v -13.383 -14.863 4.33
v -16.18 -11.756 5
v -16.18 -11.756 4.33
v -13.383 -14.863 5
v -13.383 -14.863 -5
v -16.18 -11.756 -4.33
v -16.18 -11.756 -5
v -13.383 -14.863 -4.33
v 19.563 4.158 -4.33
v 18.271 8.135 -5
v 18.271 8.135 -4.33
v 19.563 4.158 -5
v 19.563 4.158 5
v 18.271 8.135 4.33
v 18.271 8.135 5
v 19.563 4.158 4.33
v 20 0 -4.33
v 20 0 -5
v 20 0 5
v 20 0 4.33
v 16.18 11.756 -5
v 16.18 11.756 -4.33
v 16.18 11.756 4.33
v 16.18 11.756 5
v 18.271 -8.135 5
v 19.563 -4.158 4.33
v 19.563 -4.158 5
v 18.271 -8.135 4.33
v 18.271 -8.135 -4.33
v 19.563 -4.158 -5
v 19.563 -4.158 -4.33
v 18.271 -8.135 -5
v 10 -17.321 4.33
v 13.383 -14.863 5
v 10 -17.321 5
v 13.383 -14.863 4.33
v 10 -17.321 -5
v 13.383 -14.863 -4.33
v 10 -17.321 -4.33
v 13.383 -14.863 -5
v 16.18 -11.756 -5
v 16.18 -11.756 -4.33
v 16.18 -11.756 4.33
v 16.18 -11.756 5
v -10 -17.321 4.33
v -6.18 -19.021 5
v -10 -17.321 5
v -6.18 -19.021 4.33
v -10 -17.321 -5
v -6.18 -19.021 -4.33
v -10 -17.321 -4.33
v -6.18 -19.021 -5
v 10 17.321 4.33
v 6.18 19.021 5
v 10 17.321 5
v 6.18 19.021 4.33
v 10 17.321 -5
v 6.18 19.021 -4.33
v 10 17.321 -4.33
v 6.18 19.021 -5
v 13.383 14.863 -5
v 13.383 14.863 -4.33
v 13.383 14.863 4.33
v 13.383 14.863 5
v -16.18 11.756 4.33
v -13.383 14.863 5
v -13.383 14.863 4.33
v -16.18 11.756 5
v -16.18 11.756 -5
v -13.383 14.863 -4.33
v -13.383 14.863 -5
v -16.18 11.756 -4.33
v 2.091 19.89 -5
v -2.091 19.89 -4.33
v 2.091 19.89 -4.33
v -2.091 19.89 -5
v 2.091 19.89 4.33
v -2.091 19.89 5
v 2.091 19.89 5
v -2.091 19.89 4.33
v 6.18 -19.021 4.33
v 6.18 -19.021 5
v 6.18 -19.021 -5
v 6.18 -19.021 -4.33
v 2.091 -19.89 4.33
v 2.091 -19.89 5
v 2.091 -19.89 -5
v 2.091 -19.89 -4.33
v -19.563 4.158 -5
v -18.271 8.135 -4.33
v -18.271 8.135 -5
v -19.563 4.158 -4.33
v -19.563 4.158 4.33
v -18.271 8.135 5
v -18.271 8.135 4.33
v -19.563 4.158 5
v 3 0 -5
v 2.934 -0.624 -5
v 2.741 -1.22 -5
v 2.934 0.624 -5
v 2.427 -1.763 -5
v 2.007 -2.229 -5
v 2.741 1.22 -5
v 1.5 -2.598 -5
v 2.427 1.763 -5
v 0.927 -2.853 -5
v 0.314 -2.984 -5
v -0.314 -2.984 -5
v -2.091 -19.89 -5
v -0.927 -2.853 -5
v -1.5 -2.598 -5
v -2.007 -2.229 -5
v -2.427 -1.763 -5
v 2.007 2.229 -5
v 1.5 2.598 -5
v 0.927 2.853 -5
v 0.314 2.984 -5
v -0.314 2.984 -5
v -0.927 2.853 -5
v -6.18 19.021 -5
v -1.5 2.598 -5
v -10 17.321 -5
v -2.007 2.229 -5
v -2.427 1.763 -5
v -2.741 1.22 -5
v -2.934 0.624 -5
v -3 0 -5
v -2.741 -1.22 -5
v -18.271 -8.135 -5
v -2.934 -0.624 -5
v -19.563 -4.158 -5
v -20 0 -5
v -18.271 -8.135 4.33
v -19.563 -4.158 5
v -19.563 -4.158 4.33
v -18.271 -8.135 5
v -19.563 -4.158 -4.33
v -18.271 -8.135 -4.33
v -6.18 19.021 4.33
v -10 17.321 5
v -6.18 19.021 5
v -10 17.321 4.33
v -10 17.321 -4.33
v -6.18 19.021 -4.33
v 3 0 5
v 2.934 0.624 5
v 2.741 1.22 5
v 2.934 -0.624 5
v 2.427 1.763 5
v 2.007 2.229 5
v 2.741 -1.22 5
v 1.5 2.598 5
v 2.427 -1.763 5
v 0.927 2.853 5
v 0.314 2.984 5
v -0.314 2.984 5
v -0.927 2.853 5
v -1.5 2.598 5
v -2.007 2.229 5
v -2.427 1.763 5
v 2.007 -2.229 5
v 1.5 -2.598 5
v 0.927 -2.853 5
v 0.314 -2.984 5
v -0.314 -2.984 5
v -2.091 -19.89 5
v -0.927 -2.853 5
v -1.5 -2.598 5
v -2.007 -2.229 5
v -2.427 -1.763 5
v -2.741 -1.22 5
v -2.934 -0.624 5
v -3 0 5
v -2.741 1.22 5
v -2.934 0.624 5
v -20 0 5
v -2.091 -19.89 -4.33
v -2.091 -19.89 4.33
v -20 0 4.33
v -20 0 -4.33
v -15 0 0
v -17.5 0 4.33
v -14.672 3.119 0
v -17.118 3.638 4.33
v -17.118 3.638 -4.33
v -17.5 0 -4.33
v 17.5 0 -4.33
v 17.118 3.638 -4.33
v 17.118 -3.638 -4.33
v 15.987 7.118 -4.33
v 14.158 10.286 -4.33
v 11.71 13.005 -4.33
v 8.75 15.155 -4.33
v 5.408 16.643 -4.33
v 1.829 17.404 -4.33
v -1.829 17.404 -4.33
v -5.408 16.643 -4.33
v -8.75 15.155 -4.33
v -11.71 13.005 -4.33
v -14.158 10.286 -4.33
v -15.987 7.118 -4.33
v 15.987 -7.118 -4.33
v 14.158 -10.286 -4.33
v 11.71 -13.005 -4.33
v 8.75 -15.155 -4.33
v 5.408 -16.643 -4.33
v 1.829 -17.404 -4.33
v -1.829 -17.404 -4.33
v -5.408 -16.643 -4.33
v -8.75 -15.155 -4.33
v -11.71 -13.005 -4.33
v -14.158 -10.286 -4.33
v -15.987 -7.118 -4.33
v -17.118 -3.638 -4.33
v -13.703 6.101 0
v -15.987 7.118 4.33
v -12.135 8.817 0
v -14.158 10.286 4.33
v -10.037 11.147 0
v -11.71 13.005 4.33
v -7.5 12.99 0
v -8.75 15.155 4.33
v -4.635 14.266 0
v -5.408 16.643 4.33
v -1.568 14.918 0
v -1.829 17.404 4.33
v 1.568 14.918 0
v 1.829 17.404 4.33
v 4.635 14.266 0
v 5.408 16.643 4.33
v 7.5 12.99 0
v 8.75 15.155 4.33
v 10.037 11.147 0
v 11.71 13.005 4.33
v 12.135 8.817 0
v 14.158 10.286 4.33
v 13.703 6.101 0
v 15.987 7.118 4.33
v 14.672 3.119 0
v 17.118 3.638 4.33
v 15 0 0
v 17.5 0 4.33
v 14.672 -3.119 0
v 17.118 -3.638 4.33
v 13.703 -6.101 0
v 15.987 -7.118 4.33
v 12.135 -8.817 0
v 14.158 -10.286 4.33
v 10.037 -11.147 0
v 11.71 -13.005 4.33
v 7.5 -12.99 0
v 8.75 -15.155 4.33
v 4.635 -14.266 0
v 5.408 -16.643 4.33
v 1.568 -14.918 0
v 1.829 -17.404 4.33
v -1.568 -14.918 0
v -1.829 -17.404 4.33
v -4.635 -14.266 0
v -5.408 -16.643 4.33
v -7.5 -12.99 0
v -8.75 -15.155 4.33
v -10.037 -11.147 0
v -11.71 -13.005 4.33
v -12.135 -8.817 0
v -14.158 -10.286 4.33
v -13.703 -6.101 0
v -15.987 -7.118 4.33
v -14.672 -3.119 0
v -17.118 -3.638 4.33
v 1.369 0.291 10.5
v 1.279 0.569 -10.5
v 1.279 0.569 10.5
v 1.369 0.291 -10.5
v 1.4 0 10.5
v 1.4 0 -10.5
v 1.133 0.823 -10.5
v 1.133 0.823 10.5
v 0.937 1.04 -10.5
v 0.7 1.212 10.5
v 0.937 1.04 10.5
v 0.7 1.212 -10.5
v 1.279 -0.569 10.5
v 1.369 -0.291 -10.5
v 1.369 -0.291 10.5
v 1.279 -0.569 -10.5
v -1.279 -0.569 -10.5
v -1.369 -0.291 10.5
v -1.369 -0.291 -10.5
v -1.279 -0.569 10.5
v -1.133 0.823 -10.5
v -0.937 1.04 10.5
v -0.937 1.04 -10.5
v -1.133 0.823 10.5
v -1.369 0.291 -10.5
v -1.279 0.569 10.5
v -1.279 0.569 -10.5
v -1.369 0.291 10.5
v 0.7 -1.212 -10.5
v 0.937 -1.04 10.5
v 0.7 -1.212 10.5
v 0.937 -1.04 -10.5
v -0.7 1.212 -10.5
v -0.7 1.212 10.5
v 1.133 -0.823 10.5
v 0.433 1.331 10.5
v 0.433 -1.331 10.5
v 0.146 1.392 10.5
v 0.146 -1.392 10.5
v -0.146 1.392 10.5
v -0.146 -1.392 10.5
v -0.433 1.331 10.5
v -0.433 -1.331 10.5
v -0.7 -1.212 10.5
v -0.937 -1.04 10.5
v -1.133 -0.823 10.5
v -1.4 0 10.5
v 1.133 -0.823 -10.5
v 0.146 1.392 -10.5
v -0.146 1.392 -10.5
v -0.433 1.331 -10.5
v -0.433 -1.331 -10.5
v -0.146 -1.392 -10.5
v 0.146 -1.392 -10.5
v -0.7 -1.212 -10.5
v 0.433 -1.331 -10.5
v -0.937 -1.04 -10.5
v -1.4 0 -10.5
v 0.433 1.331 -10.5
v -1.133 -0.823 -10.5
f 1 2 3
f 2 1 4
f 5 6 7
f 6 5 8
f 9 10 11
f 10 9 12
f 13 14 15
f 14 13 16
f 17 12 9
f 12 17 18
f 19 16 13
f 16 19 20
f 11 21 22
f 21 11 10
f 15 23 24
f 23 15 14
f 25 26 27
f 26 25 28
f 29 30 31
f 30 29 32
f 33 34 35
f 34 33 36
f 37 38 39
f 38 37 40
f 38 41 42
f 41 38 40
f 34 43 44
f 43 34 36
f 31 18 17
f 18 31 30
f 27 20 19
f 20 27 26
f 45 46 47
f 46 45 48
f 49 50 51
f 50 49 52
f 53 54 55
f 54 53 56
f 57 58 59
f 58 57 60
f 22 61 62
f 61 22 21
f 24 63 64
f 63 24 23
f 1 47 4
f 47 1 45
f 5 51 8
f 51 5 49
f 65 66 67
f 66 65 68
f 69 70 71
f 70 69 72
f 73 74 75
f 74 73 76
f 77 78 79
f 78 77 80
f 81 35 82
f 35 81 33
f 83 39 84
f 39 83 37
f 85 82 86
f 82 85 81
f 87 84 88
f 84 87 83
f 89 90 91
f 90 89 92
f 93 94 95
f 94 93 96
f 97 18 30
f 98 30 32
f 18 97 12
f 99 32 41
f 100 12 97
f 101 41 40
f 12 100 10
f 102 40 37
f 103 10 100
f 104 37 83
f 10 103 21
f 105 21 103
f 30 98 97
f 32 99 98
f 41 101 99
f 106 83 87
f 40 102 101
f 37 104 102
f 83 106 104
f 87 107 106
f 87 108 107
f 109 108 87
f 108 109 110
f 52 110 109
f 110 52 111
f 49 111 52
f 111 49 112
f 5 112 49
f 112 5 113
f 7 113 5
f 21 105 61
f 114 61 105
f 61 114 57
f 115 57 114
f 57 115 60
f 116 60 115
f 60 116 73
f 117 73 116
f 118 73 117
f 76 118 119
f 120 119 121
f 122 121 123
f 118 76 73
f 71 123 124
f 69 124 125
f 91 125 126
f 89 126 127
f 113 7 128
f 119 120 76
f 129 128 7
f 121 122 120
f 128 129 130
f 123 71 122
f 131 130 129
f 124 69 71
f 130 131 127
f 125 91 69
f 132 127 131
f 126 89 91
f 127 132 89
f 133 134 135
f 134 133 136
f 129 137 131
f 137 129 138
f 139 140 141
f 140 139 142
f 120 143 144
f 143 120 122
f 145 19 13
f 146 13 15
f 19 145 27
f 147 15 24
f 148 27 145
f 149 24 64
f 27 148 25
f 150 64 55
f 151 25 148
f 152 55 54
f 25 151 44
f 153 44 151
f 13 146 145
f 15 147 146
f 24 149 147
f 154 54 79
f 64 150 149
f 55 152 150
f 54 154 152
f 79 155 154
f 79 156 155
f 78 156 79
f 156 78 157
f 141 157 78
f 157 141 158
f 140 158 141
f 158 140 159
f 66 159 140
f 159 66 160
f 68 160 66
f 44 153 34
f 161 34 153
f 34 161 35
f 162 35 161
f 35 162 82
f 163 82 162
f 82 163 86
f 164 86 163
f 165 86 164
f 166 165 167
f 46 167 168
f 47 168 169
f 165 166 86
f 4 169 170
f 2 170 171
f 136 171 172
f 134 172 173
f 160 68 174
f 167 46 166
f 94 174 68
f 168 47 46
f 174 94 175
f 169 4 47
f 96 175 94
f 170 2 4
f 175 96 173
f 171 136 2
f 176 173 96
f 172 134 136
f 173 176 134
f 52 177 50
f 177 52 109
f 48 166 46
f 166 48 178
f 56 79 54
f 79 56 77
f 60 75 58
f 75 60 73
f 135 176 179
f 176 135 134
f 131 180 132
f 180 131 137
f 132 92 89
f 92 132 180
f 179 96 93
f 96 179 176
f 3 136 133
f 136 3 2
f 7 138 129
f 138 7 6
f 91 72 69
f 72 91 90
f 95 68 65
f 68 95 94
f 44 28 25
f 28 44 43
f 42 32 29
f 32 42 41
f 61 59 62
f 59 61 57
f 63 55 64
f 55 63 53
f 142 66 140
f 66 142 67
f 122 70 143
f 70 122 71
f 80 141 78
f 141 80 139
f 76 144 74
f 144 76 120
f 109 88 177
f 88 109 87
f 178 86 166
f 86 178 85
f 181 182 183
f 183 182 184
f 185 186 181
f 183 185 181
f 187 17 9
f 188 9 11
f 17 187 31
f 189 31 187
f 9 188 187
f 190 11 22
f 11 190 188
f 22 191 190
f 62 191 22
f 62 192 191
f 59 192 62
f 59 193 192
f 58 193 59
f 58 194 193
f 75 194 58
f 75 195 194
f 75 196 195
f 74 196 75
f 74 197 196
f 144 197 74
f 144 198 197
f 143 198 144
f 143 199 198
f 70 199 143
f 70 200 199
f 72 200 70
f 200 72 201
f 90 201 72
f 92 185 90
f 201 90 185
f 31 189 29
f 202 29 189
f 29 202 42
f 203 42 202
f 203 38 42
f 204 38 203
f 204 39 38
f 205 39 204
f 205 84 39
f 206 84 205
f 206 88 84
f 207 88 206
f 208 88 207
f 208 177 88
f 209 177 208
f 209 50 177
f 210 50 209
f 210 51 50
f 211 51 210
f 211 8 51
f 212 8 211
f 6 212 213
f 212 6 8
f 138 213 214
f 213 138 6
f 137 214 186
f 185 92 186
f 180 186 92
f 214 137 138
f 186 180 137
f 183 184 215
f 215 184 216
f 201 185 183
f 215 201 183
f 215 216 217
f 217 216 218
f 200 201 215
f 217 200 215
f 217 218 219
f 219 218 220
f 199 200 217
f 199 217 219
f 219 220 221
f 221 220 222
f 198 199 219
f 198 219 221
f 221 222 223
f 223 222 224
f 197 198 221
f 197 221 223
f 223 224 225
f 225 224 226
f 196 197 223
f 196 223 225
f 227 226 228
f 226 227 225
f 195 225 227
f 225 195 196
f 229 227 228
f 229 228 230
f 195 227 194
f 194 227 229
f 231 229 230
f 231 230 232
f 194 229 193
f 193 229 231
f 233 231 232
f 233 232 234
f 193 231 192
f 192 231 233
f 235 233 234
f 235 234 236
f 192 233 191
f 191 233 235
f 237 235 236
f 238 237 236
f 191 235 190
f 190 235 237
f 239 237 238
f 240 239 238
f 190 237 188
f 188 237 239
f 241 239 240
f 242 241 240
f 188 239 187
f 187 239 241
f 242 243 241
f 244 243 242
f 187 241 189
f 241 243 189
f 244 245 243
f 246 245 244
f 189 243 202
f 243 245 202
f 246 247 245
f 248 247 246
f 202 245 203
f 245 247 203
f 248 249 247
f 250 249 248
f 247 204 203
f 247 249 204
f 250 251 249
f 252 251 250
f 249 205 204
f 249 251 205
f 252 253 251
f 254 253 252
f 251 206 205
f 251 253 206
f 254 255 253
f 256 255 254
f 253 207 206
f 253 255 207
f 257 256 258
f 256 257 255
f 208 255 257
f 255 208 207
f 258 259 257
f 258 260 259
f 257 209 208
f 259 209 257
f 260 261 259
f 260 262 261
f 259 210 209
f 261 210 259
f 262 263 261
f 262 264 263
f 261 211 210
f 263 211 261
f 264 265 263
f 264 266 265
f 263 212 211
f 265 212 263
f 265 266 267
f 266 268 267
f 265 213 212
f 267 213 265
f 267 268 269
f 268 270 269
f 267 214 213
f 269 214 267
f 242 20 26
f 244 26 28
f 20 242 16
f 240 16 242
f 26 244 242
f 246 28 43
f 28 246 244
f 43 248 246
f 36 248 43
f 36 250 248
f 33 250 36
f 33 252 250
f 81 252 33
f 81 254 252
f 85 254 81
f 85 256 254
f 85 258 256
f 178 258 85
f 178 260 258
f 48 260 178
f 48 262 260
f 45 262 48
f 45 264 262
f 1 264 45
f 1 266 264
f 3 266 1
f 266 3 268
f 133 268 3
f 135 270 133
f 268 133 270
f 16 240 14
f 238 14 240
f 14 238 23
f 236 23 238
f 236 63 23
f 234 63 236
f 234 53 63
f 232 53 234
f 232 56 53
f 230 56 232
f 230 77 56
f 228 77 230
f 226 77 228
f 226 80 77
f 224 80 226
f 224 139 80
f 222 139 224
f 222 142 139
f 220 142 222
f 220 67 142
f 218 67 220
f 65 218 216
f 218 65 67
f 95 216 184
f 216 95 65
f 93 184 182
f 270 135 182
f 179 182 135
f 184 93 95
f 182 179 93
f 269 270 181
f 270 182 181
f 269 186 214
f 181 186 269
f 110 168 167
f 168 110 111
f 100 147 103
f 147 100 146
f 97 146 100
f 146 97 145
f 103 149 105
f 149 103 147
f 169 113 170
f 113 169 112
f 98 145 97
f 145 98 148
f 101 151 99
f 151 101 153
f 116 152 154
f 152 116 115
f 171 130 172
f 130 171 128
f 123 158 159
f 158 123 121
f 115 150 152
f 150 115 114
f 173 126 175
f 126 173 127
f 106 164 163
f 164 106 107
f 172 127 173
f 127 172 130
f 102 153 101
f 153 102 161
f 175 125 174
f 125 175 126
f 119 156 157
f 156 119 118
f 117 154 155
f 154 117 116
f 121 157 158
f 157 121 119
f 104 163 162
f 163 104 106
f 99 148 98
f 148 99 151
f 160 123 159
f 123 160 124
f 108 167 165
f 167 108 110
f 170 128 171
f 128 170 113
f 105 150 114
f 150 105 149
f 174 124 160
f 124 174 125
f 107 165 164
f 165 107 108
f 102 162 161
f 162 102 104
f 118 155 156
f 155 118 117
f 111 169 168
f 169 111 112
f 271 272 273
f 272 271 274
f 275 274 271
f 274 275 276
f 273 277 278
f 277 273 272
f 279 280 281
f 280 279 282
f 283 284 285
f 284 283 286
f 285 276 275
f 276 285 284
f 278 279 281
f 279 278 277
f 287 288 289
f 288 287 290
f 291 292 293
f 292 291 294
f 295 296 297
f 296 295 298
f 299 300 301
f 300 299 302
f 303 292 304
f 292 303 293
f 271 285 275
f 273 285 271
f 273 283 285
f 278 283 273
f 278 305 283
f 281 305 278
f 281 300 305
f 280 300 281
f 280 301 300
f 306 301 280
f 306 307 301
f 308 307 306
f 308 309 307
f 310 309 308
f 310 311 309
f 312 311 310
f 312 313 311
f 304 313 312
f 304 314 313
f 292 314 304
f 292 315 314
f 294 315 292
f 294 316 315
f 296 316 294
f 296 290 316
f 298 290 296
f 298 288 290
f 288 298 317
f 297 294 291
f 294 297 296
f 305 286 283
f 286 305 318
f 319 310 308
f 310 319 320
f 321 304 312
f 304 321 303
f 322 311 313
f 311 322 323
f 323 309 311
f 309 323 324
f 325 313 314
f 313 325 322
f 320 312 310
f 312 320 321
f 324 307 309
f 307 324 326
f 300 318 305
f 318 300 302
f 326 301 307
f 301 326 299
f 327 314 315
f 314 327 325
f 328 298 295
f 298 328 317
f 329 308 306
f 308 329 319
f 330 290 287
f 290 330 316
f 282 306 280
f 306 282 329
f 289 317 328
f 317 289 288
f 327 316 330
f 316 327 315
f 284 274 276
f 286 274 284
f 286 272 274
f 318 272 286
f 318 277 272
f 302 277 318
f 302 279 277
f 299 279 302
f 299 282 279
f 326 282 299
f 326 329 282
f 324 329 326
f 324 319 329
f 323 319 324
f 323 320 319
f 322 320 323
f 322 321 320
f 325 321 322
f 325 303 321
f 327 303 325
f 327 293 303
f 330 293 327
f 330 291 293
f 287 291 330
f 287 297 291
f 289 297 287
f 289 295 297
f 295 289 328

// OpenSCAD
$fn=30;
radius_bar =5; //mm
bend_radius =15; //long wheel 


module Carrier_Wheel_axle(){
    cylinder(r=1.4,h=21,center=true);  

}    

 module Carrier_Wheel(){

    difference() {
        cylinder(r=20,h=10,center=true);

        rotate_extrude()
        translate([bend_radius + radius_bar, 0, 0])
            circle(r=radius_bar,$fn=6);

        cylinder(d=6,h=20,center=true);
     }
}

Carrier_Wheel();

Carrier_Wheel_axle();
